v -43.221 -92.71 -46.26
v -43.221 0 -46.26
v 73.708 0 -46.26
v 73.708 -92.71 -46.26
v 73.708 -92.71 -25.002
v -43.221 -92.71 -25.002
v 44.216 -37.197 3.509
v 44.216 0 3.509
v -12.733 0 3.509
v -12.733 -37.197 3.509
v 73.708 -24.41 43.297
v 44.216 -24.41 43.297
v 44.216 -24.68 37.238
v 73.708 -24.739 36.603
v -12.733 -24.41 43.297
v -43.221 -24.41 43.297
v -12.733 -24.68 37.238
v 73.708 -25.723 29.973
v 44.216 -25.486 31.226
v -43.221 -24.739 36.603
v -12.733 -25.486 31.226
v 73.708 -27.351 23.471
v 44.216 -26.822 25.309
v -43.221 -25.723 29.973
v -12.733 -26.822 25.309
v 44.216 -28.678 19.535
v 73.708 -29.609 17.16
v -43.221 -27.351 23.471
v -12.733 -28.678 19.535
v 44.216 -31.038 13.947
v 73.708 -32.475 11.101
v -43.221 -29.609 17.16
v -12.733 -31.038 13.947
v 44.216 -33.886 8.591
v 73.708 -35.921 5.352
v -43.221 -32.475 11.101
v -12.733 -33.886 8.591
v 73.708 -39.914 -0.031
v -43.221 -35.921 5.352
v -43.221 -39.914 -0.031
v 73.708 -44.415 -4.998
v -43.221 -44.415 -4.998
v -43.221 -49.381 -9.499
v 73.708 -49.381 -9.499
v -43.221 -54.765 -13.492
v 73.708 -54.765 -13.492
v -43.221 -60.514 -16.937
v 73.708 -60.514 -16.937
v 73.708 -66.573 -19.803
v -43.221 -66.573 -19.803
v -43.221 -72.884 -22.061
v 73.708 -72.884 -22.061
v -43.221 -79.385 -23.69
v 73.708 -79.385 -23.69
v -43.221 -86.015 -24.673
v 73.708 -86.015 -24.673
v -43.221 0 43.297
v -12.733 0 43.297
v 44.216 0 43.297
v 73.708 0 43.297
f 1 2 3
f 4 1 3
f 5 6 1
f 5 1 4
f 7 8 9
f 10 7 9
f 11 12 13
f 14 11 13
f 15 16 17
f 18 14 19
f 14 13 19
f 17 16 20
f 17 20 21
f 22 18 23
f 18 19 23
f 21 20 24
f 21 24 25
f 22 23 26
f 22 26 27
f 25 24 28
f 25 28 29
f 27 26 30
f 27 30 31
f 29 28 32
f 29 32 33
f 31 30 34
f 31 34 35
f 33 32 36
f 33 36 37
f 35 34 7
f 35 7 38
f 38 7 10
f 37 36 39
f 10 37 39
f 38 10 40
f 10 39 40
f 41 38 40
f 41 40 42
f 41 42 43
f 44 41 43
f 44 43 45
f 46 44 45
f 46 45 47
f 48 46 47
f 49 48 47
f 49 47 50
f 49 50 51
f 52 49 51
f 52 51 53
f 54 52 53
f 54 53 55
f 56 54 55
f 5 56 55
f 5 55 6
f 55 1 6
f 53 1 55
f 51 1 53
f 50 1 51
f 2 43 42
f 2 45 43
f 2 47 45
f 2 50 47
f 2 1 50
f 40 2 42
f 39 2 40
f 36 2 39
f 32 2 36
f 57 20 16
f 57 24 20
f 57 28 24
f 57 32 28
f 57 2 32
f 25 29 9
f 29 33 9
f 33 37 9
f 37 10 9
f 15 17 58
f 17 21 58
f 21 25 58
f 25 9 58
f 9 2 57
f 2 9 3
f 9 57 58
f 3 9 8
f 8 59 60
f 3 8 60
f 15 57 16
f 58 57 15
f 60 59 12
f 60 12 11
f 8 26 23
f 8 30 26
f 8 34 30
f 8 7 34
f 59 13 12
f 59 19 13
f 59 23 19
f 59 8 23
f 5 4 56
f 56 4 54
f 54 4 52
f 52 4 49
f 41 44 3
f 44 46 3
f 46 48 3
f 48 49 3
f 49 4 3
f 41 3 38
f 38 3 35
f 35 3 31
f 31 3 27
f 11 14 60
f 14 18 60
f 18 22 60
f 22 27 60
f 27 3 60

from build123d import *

# Parameters (mm, degrees)
F0_W     = 116.9285327196
F0_H     = 89.5570702851
F1_DEPTH = 92.71
F3_DEPTH = 116.9295327196
F4_W     = 56.9494720548
F4_H     = 39.7882887628
F5_DEPTH = 92.711


with BuildPart() as f1:
    # F0 (on Front) → F1 (new body)
    with BuildSketch(Plane.XZ):
        with Locations((15.2437537909, -1.4810357243)):
            Rectangle(F0_W, F0_H)
    extrude(amount=F1_DEPTH)

    # F2 (on face) → F3 (cut, through all)
    with BuildSketch(Plane(origin=(-43.220512569, 0, 0), x_dir=(0, -1, 0), z_dir=(-1, 0, 0))):
        with BuildLine():
            ThreePointArc((92.71, -25.0020706653), (141.0050891582, -4.9975897399), (161.0095700836, 43.2974994183))
            ThreePointArc((161.0095700836, 43.2974994183), (92.71, 111.5970695018), (24.4104299164, 43.2974994183))
            Line((24.4104299164, 43.2974994183), (92.71, 43.2974994183))
            Line((92.71, 43.2974994183), (92.71, -25.0020706653))
        make_face()
        with BuildLine():
            Line((92.71, 43.2974994183), (24.4104299164, 43.2974994183))
            ThreePointArc((24.4104299164, 43.2974994183), (44.4149108418, -4.9975897399), (92.71, -25.0020706653))
            Line((92.71, -25.0020706653), (92.71, 43.2974994183))
        make_face()
    extrude(amount=-F3_DEPTH, mode=Mode.SUBTRACT)

    # F4 (on face) → F5 (cut, through all)
    with BuildSketch(Plane(origin=(0, 0, 0), x_dir=(-1, 0, 0), z_dir=(0, 1, 0))):
        with Locations((-15.7413156703, 23.4033550369)):
            Rectangle(F4_W, F4_H)
    extrude(amount=-F5_DEPTH, mode=Mode.SUBTRACT)


solid = f1.part
